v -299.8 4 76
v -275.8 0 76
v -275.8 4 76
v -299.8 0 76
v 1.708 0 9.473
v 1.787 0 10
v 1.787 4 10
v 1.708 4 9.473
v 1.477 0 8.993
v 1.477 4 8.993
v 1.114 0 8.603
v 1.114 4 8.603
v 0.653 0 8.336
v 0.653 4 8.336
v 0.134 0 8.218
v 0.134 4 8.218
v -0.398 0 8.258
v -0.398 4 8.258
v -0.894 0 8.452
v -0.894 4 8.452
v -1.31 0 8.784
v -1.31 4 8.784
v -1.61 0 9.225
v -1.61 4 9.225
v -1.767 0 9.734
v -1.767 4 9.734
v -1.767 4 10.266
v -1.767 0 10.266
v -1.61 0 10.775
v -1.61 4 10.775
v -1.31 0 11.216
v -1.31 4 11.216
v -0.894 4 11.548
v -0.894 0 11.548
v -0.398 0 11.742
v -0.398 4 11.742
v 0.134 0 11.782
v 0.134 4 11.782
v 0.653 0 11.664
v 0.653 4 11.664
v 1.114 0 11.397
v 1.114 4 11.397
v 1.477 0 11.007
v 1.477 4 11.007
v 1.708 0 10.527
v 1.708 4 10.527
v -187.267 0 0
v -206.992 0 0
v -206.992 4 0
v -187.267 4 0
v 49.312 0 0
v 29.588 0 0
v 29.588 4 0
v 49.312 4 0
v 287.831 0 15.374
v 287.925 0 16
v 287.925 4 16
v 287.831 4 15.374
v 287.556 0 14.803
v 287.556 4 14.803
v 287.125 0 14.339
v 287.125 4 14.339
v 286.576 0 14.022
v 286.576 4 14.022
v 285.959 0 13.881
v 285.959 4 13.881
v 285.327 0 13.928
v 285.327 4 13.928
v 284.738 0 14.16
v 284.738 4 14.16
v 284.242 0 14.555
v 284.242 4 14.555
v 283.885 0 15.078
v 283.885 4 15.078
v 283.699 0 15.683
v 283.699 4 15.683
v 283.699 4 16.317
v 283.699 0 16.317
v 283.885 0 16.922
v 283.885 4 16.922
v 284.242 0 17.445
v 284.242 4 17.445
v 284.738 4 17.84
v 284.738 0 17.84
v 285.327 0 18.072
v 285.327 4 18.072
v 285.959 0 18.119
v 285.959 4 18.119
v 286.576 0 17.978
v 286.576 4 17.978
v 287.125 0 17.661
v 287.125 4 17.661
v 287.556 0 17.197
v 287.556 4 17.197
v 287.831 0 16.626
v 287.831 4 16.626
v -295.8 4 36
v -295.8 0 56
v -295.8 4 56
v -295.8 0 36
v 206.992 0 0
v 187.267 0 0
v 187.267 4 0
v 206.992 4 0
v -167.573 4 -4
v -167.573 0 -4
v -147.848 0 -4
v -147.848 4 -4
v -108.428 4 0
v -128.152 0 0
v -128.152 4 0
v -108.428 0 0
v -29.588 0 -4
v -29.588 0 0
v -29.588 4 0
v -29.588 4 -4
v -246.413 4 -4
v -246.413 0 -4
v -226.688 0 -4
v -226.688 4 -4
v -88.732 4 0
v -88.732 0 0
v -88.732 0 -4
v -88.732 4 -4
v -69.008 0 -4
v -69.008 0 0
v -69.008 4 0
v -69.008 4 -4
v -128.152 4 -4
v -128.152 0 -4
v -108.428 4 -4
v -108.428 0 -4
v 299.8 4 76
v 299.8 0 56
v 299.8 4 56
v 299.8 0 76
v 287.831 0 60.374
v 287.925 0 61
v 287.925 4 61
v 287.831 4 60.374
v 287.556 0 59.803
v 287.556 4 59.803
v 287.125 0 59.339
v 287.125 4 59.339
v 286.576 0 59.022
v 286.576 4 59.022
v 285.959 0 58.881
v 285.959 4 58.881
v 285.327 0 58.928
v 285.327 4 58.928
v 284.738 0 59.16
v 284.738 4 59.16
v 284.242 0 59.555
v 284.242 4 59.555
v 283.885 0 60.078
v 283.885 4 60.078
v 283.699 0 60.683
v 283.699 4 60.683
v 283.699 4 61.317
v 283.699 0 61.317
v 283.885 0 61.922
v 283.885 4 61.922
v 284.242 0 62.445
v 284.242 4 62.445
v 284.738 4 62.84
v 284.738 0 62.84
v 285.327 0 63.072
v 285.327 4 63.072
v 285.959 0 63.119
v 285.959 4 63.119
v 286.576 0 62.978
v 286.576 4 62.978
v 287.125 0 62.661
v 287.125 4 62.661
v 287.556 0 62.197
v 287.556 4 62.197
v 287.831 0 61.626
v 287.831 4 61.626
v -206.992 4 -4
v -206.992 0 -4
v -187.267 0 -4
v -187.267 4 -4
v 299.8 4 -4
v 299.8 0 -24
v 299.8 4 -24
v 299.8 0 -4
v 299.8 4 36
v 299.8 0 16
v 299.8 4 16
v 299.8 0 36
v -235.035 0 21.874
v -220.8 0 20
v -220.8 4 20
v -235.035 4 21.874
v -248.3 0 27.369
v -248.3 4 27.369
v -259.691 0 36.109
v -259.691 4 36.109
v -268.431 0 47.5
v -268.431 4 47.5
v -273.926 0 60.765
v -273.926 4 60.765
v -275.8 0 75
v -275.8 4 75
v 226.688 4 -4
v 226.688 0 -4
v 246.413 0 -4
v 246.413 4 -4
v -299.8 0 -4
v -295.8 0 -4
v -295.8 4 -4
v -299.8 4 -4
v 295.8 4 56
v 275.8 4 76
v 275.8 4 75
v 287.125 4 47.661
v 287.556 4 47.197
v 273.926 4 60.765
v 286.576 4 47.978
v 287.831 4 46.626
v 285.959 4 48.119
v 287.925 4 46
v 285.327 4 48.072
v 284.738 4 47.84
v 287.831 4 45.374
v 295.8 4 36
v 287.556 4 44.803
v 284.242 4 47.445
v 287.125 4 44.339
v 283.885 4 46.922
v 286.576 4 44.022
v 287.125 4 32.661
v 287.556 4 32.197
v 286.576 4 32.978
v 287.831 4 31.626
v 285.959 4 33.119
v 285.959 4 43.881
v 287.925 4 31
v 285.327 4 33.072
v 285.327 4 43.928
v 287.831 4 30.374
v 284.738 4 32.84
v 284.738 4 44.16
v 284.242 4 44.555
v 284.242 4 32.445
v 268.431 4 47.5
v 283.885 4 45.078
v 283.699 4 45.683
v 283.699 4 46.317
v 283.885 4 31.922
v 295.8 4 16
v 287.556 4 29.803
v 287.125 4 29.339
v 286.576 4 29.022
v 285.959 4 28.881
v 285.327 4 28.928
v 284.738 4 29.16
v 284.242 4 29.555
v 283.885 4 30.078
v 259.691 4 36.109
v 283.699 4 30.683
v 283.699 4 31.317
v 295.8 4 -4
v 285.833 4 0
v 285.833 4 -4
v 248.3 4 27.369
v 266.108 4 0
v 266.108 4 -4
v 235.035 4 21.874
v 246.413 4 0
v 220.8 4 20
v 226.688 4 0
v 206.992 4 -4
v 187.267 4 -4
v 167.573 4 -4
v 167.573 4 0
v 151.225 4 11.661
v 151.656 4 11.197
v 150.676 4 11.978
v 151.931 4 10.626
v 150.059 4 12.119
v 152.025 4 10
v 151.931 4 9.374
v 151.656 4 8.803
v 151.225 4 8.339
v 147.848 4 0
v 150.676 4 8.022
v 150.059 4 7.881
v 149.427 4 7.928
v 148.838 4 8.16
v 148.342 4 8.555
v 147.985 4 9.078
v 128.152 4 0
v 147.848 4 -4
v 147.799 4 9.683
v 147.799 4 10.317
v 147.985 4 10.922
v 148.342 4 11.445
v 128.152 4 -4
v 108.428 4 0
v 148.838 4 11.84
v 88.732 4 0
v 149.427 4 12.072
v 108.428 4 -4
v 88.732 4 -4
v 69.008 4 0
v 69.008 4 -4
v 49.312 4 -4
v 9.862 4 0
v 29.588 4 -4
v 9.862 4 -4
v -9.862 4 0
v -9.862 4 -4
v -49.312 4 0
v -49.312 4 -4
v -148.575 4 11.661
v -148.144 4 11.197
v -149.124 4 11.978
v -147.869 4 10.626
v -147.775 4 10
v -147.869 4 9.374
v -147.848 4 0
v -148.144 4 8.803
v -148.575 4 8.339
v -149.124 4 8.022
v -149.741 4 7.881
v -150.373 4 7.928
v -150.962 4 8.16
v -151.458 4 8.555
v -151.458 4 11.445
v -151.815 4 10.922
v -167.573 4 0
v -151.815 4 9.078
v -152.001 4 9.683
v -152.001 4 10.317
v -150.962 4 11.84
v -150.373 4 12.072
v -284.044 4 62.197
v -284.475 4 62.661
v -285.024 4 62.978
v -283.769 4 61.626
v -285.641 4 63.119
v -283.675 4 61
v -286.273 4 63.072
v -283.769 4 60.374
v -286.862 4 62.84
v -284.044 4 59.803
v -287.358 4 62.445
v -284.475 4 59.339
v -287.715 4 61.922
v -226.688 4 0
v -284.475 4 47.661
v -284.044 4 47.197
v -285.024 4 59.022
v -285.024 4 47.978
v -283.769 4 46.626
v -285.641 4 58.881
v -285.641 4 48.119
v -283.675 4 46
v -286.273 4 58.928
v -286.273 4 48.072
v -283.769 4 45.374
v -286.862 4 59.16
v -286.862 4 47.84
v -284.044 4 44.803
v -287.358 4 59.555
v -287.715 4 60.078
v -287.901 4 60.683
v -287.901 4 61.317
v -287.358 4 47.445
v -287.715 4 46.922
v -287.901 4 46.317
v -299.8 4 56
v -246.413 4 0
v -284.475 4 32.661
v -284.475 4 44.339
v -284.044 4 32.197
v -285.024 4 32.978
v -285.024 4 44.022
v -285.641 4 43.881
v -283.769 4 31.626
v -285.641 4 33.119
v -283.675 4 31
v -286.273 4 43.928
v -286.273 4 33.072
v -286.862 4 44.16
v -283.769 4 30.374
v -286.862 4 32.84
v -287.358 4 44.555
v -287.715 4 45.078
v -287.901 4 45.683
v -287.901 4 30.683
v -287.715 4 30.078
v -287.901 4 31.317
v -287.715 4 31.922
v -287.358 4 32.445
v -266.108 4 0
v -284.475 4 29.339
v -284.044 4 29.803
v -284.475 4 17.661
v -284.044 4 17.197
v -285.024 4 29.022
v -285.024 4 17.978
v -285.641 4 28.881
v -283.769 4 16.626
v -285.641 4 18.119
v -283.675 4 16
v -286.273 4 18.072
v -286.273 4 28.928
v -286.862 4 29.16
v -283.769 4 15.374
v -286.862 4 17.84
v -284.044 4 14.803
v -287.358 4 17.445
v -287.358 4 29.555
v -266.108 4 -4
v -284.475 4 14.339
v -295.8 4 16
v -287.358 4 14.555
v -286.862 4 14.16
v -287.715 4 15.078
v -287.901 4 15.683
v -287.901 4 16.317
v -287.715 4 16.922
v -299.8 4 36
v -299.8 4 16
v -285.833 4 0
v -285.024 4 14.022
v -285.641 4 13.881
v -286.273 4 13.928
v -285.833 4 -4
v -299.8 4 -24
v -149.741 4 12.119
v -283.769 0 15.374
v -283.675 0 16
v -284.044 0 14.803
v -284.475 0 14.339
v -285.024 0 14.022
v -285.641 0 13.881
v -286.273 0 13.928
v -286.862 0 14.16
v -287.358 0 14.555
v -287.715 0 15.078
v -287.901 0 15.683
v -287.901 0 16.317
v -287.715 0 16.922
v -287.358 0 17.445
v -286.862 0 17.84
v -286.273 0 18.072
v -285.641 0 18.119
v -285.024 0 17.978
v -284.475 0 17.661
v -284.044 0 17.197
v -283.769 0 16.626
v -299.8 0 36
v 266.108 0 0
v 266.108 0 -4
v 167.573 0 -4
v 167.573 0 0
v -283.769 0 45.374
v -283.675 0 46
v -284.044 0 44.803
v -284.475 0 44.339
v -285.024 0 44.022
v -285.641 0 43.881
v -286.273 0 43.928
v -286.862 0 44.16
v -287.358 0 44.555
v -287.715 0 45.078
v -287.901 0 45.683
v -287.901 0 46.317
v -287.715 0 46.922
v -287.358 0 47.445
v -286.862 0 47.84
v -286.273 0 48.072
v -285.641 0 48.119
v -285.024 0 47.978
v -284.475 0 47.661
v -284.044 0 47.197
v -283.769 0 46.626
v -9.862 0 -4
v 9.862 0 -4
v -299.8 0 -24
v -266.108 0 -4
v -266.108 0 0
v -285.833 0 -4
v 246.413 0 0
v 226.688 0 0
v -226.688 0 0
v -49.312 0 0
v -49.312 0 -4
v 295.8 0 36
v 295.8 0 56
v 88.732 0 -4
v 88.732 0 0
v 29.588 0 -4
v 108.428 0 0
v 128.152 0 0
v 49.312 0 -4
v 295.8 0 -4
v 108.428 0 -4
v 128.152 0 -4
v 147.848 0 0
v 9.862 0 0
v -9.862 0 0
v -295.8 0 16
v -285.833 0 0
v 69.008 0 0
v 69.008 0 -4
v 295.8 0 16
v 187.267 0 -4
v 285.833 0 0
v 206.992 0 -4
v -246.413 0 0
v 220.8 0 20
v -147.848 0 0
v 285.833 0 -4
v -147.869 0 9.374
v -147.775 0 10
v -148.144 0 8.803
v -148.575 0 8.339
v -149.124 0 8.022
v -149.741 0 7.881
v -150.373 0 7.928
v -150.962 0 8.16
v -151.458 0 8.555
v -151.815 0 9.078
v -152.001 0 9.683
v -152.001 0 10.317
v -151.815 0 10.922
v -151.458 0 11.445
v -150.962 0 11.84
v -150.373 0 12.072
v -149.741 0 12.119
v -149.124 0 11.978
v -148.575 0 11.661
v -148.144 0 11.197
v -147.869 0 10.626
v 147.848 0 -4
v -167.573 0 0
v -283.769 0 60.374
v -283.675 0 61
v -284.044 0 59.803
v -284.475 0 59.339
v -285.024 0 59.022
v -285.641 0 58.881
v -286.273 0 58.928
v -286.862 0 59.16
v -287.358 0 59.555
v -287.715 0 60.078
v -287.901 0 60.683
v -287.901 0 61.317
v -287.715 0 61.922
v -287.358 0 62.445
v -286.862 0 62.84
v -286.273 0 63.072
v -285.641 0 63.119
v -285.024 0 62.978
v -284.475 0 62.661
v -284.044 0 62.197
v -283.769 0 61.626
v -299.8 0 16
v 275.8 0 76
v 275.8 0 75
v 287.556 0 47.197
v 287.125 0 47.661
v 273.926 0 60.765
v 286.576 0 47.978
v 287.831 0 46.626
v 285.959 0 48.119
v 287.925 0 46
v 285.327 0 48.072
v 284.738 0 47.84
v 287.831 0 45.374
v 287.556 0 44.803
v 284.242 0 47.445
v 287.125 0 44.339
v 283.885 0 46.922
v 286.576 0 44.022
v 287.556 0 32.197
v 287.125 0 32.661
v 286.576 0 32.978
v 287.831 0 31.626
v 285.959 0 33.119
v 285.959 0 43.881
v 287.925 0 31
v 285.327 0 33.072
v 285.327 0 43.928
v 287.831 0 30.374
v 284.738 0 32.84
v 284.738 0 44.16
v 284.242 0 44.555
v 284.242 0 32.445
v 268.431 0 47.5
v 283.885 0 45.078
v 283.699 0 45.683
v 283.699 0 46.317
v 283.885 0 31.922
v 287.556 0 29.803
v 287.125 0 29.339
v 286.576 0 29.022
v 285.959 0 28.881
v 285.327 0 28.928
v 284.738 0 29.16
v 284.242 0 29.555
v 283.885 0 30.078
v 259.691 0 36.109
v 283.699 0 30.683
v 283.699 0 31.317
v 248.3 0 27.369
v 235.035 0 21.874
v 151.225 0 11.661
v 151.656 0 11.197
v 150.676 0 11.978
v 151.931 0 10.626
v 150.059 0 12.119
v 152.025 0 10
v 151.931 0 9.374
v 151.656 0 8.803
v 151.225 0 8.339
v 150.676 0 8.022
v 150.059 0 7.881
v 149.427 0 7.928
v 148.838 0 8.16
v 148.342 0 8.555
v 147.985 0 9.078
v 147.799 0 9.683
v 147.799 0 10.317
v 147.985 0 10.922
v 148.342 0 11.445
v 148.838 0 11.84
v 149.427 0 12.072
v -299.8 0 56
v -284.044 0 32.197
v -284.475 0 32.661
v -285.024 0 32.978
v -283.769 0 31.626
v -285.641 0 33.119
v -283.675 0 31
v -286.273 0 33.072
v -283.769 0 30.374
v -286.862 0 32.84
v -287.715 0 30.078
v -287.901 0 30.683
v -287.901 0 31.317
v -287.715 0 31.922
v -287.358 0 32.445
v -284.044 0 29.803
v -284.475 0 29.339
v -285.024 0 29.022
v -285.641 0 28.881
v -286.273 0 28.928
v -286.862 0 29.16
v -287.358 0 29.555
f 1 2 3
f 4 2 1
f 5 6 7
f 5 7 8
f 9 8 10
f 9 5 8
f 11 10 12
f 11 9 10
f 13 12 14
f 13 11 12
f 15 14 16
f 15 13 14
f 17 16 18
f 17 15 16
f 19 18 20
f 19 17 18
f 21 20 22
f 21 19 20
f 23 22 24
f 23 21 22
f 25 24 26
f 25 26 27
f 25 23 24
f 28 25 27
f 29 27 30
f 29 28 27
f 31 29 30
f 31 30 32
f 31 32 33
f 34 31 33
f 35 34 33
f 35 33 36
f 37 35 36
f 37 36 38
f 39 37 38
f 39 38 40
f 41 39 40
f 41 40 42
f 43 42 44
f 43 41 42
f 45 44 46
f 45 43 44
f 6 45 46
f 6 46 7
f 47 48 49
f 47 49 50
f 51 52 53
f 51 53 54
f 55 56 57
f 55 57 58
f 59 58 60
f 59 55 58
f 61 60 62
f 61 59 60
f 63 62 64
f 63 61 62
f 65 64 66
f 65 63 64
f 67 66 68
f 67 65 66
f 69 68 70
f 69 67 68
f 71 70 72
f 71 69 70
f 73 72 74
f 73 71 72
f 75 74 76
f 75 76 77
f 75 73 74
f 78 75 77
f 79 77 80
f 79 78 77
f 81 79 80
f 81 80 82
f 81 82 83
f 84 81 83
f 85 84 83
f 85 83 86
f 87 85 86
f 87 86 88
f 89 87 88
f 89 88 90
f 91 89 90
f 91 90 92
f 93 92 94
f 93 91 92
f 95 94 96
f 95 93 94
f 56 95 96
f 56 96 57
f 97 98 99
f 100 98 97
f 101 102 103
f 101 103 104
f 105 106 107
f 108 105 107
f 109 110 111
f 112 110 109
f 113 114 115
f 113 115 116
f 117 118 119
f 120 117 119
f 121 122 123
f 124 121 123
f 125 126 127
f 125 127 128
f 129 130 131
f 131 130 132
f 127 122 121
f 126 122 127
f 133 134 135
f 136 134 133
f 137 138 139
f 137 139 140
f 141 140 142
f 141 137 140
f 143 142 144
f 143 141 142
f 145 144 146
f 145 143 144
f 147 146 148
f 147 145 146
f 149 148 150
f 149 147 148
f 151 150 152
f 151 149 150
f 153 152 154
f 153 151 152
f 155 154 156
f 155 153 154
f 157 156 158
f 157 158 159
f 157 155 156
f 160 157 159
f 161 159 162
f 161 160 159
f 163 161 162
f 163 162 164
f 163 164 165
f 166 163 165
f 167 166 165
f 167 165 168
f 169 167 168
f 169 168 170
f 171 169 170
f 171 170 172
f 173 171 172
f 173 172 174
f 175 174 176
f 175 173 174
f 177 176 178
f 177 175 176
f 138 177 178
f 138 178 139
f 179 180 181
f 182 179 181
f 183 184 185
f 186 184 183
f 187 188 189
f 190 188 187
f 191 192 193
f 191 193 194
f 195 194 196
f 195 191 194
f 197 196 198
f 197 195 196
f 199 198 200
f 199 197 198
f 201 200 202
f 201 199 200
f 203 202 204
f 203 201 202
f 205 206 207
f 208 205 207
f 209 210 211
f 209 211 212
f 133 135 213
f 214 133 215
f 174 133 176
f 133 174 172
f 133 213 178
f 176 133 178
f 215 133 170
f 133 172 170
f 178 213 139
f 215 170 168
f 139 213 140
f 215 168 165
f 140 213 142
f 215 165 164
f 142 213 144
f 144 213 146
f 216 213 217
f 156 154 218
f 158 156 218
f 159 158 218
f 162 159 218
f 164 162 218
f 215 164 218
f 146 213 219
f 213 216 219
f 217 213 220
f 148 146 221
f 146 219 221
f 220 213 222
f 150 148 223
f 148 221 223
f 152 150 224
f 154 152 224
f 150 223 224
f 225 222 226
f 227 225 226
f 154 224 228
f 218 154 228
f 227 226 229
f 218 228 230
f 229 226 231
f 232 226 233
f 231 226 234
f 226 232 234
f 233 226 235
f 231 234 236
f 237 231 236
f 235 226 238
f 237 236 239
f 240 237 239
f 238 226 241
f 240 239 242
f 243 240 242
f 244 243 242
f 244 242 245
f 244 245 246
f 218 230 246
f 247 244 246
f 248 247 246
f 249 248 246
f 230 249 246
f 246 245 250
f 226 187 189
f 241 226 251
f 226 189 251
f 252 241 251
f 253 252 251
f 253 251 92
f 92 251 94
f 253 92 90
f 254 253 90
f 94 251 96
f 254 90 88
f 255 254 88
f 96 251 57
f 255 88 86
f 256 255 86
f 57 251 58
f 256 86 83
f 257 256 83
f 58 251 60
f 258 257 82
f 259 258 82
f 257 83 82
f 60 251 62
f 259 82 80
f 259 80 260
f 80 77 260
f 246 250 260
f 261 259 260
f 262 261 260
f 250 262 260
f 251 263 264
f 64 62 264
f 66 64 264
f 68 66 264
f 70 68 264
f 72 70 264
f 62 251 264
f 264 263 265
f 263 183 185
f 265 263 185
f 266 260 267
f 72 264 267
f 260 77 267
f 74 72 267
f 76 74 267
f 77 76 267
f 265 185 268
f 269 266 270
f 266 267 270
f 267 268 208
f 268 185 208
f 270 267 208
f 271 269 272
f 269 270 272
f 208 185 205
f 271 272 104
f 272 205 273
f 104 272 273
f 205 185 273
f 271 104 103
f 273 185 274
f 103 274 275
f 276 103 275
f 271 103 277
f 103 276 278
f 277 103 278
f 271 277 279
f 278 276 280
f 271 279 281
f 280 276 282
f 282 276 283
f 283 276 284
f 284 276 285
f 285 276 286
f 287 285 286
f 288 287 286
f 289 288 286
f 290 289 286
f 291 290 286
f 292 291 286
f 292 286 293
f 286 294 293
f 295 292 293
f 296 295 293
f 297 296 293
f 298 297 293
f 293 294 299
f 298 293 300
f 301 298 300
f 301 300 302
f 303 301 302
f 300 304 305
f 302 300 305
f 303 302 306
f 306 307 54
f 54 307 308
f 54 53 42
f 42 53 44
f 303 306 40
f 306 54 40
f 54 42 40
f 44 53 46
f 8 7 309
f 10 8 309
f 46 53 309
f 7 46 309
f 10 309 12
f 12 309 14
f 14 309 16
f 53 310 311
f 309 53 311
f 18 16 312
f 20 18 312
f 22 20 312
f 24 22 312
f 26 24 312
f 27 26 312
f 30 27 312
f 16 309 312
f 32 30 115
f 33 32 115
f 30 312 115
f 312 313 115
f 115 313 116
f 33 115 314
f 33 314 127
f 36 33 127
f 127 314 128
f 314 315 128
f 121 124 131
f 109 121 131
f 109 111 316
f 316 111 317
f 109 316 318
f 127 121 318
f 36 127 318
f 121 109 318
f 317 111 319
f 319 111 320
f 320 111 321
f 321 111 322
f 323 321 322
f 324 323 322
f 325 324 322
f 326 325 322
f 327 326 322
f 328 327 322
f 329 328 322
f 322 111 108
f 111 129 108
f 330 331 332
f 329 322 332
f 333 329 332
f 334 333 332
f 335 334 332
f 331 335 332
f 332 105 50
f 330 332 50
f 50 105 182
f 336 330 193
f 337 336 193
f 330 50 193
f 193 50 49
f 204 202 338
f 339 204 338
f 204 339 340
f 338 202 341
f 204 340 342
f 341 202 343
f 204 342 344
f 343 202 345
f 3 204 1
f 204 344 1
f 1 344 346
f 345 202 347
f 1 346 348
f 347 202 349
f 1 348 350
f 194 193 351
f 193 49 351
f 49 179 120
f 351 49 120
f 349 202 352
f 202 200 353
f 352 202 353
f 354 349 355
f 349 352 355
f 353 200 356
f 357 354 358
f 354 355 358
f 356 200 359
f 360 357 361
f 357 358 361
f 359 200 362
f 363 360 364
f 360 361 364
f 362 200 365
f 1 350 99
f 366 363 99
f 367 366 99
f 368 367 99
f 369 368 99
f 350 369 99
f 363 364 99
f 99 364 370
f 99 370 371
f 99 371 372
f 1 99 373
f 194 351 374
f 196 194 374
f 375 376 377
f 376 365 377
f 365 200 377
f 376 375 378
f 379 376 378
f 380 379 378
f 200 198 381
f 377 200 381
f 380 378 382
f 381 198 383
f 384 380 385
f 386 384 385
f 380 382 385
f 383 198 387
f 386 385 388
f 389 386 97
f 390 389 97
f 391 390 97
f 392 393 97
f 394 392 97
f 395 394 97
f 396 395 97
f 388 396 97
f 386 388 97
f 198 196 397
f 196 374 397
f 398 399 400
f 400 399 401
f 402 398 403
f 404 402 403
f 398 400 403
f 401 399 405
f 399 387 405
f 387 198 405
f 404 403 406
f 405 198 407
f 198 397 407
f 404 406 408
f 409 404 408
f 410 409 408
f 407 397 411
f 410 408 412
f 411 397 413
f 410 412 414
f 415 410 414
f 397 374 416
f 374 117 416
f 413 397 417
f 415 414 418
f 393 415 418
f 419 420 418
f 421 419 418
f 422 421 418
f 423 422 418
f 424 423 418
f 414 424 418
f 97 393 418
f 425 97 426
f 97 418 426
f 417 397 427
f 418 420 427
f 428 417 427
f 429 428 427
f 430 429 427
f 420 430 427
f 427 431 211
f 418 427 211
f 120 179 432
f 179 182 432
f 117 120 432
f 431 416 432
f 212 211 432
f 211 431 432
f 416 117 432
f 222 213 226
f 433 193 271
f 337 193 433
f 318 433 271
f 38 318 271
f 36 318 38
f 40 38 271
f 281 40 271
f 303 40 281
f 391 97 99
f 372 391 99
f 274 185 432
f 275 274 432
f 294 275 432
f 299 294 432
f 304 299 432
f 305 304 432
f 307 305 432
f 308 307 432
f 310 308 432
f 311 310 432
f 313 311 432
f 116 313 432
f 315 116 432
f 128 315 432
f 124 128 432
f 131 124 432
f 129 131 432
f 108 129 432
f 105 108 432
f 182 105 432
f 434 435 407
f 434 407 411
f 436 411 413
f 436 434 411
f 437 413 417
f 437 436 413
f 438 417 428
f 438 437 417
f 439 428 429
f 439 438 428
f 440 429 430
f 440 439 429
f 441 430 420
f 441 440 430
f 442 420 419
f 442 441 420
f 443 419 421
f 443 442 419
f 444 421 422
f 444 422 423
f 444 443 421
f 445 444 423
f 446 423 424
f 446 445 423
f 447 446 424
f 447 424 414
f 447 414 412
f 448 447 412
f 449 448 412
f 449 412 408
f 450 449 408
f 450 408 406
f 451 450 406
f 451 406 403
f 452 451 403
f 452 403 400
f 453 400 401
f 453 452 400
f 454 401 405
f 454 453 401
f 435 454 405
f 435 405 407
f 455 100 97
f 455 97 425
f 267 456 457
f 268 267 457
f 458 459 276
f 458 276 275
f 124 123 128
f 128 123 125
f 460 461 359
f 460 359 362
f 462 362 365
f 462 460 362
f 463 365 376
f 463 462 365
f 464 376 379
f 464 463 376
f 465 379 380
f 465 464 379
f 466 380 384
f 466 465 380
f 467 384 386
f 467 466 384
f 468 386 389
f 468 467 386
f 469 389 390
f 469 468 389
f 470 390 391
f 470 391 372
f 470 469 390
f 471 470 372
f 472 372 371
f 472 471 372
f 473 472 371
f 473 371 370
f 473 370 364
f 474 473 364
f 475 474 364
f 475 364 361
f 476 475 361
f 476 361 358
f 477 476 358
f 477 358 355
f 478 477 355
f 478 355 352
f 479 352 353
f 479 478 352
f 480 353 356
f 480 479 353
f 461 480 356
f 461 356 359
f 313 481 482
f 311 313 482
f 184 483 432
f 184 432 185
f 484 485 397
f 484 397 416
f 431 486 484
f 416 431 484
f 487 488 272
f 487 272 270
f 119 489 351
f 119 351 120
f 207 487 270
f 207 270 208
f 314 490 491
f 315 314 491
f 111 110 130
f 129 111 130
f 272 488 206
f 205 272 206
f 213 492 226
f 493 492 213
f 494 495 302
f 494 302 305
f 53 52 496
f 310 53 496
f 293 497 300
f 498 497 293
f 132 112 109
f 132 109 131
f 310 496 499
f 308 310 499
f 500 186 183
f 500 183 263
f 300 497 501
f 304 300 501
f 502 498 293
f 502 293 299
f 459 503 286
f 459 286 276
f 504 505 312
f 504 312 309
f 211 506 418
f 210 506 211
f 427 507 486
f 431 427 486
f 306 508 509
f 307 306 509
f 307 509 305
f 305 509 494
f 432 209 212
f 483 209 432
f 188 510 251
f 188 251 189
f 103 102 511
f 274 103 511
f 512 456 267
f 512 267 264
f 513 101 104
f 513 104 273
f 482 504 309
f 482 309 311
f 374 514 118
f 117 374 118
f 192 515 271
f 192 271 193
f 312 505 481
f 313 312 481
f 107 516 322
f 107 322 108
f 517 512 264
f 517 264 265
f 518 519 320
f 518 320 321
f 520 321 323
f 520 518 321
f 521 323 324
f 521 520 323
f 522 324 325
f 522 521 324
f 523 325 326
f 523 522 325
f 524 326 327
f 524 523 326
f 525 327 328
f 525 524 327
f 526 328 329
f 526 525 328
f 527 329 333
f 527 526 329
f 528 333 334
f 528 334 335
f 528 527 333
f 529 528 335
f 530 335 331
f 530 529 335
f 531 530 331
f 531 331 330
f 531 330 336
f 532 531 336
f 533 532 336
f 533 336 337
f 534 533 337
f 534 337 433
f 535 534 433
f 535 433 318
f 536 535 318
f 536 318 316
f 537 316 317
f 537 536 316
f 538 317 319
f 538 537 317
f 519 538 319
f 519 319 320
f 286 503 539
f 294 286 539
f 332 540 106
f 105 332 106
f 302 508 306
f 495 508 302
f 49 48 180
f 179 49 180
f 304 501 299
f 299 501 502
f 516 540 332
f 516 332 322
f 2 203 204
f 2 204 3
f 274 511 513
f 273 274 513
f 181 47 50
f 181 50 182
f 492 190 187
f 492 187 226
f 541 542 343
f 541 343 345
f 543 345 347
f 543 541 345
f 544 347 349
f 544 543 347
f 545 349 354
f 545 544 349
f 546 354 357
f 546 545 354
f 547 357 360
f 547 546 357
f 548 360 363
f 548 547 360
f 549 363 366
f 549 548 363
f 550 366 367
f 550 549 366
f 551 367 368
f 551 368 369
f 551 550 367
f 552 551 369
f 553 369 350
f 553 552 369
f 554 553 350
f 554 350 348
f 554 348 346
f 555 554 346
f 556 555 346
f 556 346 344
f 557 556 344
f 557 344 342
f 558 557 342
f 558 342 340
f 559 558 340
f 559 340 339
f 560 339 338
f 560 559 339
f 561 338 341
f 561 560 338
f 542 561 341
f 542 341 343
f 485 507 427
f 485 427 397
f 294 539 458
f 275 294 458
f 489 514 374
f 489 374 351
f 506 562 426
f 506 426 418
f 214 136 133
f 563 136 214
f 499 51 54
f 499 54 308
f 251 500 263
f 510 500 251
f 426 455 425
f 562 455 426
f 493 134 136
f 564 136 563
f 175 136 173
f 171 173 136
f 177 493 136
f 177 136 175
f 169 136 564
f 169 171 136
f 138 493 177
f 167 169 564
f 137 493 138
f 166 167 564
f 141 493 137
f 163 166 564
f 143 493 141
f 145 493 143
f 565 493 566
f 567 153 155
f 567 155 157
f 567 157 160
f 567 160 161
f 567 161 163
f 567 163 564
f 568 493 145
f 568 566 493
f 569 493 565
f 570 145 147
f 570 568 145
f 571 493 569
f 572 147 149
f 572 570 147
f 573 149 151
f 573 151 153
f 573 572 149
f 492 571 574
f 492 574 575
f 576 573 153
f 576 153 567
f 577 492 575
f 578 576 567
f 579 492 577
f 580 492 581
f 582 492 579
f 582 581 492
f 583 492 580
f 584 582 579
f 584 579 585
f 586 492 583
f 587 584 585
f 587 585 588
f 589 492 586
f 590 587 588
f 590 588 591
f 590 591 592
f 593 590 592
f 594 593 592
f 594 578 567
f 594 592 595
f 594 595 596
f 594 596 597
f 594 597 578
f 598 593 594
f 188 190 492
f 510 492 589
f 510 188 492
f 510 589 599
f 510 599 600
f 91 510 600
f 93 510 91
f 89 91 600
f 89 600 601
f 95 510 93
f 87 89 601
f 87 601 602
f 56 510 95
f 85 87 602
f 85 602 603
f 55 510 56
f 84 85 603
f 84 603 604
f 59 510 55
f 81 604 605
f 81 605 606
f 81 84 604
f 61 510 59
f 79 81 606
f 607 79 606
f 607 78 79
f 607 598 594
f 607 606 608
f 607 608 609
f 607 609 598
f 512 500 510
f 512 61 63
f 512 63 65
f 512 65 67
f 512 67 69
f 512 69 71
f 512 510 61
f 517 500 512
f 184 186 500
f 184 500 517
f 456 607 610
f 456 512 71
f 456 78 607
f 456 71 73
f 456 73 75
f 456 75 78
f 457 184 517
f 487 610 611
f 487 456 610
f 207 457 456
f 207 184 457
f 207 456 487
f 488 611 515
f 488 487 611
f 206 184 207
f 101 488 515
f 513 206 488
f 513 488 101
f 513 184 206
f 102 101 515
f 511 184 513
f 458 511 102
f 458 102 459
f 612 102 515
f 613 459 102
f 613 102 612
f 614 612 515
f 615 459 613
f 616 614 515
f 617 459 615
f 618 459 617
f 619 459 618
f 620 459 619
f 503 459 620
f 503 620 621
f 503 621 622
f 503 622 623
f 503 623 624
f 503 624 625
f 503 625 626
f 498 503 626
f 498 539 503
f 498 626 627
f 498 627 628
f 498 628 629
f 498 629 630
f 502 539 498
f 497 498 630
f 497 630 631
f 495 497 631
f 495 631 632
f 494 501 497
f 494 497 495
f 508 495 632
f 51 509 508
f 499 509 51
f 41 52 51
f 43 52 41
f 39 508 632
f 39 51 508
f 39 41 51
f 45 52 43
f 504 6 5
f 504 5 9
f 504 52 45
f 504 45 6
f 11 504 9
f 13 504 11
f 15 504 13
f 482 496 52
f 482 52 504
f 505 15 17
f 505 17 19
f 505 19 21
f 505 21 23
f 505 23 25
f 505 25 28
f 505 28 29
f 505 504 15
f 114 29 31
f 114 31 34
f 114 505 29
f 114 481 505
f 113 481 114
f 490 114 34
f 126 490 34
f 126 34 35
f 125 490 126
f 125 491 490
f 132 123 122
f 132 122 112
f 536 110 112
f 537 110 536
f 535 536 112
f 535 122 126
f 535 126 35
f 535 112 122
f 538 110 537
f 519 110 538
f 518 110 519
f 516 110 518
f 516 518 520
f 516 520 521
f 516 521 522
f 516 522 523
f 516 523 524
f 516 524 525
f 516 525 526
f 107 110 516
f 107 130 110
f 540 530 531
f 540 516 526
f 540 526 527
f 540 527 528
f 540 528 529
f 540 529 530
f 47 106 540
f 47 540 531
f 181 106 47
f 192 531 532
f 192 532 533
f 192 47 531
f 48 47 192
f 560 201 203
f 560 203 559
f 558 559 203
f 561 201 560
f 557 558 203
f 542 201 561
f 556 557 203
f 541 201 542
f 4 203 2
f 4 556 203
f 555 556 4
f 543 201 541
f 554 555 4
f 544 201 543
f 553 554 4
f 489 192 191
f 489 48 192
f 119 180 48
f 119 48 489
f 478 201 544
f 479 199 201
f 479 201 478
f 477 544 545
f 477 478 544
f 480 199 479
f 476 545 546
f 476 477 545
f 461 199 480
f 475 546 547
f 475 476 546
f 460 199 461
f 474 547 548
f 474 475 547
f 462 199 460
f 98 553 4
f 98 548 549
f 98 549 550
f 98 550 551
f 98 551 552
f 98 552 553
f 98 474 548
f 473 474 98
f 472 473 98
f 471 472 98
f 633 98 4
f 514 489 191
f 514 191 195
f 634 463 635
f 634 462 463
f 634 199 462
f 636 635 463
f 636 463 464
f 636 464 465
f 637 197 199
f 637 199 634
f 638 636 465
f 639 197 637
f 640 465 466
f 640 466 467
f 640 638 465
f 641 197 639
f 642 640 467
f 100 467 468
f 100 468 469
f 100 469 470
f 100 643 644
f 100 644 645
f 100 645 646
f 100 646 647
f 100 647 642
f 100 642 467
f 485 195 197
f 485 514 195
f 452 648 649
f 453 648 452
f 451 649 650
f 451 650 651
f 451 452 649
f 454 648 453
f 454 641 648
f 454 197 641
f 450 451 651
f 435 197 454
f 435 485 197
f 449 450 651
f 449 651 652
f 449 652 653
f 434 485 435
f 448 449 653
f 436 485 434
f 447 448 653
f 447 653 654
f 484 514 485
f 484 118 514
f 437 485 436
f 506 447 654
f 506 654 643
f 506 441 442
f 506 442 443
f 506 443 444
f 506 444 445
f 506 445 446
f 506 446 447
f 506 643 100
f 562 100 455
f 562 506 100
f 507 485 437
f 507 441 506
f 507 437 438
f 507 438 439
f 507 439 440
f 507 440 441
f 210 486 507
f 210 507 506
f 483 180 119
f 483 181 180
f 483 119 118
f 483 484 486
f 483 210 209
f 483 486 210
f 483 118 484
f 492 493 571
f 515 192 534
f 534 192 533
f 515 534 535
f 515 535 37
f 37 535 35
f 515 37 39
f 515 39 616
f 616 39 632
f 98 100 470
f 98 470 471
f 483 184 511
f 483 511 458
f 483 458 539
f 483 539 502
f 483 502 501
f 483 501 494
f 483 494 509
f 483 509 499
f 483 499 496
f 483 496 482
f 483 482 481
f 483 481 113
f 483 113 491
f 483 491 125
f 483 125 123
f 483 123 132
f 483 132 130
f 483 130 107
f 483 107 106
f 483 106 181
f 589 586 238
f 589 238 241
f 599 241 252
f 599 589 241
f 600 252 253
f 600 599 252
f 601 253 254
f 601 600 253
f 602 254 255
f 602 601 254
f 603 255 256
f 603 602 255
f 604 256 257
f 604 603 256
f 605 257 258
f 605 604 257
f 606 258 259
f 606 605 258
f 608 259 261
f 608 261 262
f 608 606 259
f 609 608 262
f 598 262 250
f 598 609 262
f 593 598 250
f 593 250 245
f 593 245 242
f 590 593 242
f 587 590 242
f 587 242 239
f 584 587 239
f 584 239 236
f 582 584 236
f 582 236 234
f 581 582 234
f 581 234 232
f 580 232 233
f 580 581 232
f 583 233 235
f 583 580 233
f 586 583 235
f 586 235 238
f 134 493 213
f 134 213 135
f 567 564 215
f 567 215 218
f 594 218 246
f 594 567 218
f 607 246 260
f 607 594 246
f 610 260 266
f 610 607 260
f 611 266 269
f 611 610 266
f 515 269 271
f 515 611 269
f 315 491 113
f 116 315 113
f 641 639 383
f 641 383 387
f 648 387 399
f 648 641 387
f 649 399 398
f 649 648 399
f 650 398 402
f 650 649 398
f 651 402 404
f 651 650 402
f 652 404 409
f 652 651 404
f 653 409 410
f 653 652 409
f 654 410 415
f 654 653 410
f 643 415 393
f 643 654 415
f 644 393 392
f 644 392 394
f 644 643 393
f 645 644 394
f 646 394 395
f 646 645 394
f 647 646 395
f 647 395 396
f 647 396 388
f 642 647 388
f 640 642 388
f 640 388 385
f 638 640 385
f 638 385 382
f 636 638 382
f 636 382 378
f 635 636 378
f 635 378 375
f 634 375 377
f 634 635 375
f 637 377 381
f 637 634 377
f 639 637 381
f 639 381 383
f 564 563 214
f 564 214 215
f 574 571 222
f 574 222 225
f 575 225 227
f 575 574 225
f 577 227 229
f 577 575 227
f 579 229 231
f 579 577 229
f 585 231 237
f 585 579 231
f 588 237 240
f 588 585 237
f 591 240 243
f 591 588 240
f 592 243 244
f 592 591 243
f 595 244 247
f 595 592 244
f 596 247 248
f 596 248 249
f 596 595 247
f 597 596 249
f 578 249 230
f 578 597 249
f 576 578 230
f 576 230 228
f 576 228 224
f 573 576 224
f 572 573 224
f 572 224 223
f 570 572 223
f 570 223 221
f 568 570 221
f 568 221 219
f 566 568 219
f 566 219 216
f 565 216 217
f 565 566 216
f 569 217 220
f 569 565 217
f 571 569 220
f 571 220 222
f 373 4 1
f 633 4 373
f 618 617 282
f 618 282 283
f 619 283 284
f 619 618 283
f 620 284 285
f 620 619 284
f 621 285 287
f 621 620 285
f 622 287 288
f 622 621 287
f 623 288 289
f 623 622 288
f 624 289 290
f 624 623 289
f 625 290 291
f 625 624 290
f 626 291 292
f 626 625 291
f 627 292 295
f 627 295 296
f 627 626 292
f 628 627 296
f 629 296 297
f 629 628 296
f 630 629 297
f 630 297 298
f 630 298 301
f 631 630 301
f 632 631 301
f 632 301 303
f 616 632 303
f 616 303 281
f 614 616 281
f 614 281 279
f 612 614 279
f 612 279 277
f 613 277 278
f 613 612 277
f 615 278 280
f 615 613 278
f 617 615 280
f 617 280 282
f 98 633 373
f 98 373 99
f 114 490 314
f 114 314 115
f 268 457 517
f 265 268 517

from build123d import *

# Parameters (mm, degrees)
SKETCH1_R           = 2.125
SKETCH1_R_2         = 1.787095899
SKETCH1_W           = 19.725
SKETCH1_H           = 4
BOSS_EXTRUDE1_DEPTH = 4


with BuildPart() as part:
    # Sketch1 → Boss-Extrude1 (new body)
    with BuildSketch(Plane(origin=(0, 0, 0), x_dir=(1, 0, 0), z_dir=(0, 1, 0))):
        with BuildLine():
            Line((299.8, 24), (299.8, 4))
            Line((299.8, 4), (295.8, 4))
            Line((295.8, 4), (295.8, -16))
            Line((295.8, -16), (299.8, -16))
            Line((299.8, -16), (299.8, -36))
            Line((299.8, -36), (295.8, -36))
            Line((295.8, -36), (295.8, -56))
            Line((295.8, -56), (299.8, -56))
            Line((299.8, -56), (299.8, -76))
            Line((299.8, -76), (275.8, -76))
            Line((275.8, -76), (275.8, -75))
            ThreePointArc((275.8, -75), (259.690872965, -36.109127035), (220.8, -20))
            Line((220.8, -20), (-220.8, -20))
            ThreePointArc((-220.8, -20), (-259.690872965, -36.109127035), (-275.8, -75))
            Line((-275.8, -75), (-275.8, -76))
            Line((-275.8, -76), (-299.8, -76))
            Line((-299.8, -76), (-299.8, -56))
            Line((-299.8, -56), (-295.8, -56))
            Line((-295.8, -56), (-295.8, -36))
            Line((-295.8, -36), (-299.8, -36))
            Line((-299.8, -36), (-299.8, -16))
            Line((-299.8, -16), (-295.8, -16))
            Line((-295.8, -16), (-295.8, 4))
            Line((-295.8, 4), (-299.8, 4))
            Line((-299.8, 4), (-299.8, 24))
            Line((-299.8, 24), (299.8, 24))
        make_face()
        with Locations((285.8, -61)):
            Circle(SKETCH1_R, mode=Mode.SUBTRACT)
        with Locations((285.8, -46)):
            Circle(SKETCH1_R, mode=Mode.SUBTRACT)
        with Locations((-285.8, -46)):
            Circle(SKETCH1_R, mode=Mode.SUBTRACT)
        with Locations((-285.8, -61)):
            Circle(SKETCH1_R, mode=Mode.SUBTRACT)
        with Locations((285.8, -16)):
            Circle(SKETCH1_R, mode=Mode.SUBTRACT)
        with Locations((285.8, -31)):
            Circle(SKETCH1_R, mode=Mode.SUBTRACT)
        with Locations((-285.8, -31)):
            Circle(SKETCH1_R, mode=Mode.SUBTRACT)
        with Locations((-285.8, -16)):
            Circle(SKETCH1_R, mode=Mode.SUBTRACT)
        with Locations((-149.9, -10)):
            Circle(SKETCH1_R, mode=Mode.SUBTRACT)
        with Locations((149.9, -10)):
            Circle(SKETCH1_R, mode=Mode.SUBTRACT)
        with Locations((0, -10)):
            Circle(SKETCH1_R_2, mode=Mode.SUBTRACT)
        with Locations((0, 2)):
            Rectangle(SKETCH1_W, SKETCH1_H, mode=Mode.SUBTRACT)
        with Locations((39.45, 2)):
            Rectangle(SKETCH1_W, SKETCH1_H, mode=Mode.SUBTRACT)
        with Locations((78.87, 2)):
            Rectangle(SKETCH1_W, SKETCH1_H, mode=Mode.SUBTRACT)
        with Locations((118.29, 2)):
            Rectangle(SKETCH1_W, SKETCH1_H, mode=Mode.SUBTRACT)
        with Locations((157.71, 2)):
            Rectangle(SKETCH1_W, SKETCH1_H, mode=Mode.SUBTRACT)
        with Locations((197.13, 2)):
            Rectangle(SKETCH1_W, SKETCH1_H, mode=Mode.SUBTRACT)
        with Locations((236.55, 2)):
            Rectangle(SKETCH1_W, SKETCH1_H, mode=Mode.SUBTRACT)
        with Locations((275.97, 2)):
            Rectangle(SKETCH1_W, SKETCH1_H, mode=Mode.SUBTRACT)
        with Locations((-275.97, 2)):
            Rectangle(SKETCH1_W, SKETCH1_H, mode=Mode.SUBTRACT)
        with Locations((-236.55, 2)):
            Rectangle(SKETCH1_W, SKETCH1_H, mode=Mode.SUBTRACT)
        with Locations((-197.13, 2)):
            Rectangle(SKETCH1_W, SKETCH1_H, mode=Mode.SUBTRACT)
        with Locations((-157.71, 2)):
            Rectangle(SKETCH1_W, SKETCH1_H, mode=Mode.SUBTRACT)
        with Locations((-118.29, 2)):
            Rectangle(SKETCH1_W, SKETCH1_H, mode=Mode.SUBTRACT)
        with Locations((-78.87, 2)):
            Rectangle(SKETCH1_W, SKETCH1_H, mode=Mode.SUBTRACT)
        with Locations((-39.45, 2)):
            Rectangle(SKETCH1_W, SKETCH1_H, mode=Mode.SUBTRACT)
    extrude(amount=BOSS_EXTRUDE1_DEPTH)


solid = part.part
